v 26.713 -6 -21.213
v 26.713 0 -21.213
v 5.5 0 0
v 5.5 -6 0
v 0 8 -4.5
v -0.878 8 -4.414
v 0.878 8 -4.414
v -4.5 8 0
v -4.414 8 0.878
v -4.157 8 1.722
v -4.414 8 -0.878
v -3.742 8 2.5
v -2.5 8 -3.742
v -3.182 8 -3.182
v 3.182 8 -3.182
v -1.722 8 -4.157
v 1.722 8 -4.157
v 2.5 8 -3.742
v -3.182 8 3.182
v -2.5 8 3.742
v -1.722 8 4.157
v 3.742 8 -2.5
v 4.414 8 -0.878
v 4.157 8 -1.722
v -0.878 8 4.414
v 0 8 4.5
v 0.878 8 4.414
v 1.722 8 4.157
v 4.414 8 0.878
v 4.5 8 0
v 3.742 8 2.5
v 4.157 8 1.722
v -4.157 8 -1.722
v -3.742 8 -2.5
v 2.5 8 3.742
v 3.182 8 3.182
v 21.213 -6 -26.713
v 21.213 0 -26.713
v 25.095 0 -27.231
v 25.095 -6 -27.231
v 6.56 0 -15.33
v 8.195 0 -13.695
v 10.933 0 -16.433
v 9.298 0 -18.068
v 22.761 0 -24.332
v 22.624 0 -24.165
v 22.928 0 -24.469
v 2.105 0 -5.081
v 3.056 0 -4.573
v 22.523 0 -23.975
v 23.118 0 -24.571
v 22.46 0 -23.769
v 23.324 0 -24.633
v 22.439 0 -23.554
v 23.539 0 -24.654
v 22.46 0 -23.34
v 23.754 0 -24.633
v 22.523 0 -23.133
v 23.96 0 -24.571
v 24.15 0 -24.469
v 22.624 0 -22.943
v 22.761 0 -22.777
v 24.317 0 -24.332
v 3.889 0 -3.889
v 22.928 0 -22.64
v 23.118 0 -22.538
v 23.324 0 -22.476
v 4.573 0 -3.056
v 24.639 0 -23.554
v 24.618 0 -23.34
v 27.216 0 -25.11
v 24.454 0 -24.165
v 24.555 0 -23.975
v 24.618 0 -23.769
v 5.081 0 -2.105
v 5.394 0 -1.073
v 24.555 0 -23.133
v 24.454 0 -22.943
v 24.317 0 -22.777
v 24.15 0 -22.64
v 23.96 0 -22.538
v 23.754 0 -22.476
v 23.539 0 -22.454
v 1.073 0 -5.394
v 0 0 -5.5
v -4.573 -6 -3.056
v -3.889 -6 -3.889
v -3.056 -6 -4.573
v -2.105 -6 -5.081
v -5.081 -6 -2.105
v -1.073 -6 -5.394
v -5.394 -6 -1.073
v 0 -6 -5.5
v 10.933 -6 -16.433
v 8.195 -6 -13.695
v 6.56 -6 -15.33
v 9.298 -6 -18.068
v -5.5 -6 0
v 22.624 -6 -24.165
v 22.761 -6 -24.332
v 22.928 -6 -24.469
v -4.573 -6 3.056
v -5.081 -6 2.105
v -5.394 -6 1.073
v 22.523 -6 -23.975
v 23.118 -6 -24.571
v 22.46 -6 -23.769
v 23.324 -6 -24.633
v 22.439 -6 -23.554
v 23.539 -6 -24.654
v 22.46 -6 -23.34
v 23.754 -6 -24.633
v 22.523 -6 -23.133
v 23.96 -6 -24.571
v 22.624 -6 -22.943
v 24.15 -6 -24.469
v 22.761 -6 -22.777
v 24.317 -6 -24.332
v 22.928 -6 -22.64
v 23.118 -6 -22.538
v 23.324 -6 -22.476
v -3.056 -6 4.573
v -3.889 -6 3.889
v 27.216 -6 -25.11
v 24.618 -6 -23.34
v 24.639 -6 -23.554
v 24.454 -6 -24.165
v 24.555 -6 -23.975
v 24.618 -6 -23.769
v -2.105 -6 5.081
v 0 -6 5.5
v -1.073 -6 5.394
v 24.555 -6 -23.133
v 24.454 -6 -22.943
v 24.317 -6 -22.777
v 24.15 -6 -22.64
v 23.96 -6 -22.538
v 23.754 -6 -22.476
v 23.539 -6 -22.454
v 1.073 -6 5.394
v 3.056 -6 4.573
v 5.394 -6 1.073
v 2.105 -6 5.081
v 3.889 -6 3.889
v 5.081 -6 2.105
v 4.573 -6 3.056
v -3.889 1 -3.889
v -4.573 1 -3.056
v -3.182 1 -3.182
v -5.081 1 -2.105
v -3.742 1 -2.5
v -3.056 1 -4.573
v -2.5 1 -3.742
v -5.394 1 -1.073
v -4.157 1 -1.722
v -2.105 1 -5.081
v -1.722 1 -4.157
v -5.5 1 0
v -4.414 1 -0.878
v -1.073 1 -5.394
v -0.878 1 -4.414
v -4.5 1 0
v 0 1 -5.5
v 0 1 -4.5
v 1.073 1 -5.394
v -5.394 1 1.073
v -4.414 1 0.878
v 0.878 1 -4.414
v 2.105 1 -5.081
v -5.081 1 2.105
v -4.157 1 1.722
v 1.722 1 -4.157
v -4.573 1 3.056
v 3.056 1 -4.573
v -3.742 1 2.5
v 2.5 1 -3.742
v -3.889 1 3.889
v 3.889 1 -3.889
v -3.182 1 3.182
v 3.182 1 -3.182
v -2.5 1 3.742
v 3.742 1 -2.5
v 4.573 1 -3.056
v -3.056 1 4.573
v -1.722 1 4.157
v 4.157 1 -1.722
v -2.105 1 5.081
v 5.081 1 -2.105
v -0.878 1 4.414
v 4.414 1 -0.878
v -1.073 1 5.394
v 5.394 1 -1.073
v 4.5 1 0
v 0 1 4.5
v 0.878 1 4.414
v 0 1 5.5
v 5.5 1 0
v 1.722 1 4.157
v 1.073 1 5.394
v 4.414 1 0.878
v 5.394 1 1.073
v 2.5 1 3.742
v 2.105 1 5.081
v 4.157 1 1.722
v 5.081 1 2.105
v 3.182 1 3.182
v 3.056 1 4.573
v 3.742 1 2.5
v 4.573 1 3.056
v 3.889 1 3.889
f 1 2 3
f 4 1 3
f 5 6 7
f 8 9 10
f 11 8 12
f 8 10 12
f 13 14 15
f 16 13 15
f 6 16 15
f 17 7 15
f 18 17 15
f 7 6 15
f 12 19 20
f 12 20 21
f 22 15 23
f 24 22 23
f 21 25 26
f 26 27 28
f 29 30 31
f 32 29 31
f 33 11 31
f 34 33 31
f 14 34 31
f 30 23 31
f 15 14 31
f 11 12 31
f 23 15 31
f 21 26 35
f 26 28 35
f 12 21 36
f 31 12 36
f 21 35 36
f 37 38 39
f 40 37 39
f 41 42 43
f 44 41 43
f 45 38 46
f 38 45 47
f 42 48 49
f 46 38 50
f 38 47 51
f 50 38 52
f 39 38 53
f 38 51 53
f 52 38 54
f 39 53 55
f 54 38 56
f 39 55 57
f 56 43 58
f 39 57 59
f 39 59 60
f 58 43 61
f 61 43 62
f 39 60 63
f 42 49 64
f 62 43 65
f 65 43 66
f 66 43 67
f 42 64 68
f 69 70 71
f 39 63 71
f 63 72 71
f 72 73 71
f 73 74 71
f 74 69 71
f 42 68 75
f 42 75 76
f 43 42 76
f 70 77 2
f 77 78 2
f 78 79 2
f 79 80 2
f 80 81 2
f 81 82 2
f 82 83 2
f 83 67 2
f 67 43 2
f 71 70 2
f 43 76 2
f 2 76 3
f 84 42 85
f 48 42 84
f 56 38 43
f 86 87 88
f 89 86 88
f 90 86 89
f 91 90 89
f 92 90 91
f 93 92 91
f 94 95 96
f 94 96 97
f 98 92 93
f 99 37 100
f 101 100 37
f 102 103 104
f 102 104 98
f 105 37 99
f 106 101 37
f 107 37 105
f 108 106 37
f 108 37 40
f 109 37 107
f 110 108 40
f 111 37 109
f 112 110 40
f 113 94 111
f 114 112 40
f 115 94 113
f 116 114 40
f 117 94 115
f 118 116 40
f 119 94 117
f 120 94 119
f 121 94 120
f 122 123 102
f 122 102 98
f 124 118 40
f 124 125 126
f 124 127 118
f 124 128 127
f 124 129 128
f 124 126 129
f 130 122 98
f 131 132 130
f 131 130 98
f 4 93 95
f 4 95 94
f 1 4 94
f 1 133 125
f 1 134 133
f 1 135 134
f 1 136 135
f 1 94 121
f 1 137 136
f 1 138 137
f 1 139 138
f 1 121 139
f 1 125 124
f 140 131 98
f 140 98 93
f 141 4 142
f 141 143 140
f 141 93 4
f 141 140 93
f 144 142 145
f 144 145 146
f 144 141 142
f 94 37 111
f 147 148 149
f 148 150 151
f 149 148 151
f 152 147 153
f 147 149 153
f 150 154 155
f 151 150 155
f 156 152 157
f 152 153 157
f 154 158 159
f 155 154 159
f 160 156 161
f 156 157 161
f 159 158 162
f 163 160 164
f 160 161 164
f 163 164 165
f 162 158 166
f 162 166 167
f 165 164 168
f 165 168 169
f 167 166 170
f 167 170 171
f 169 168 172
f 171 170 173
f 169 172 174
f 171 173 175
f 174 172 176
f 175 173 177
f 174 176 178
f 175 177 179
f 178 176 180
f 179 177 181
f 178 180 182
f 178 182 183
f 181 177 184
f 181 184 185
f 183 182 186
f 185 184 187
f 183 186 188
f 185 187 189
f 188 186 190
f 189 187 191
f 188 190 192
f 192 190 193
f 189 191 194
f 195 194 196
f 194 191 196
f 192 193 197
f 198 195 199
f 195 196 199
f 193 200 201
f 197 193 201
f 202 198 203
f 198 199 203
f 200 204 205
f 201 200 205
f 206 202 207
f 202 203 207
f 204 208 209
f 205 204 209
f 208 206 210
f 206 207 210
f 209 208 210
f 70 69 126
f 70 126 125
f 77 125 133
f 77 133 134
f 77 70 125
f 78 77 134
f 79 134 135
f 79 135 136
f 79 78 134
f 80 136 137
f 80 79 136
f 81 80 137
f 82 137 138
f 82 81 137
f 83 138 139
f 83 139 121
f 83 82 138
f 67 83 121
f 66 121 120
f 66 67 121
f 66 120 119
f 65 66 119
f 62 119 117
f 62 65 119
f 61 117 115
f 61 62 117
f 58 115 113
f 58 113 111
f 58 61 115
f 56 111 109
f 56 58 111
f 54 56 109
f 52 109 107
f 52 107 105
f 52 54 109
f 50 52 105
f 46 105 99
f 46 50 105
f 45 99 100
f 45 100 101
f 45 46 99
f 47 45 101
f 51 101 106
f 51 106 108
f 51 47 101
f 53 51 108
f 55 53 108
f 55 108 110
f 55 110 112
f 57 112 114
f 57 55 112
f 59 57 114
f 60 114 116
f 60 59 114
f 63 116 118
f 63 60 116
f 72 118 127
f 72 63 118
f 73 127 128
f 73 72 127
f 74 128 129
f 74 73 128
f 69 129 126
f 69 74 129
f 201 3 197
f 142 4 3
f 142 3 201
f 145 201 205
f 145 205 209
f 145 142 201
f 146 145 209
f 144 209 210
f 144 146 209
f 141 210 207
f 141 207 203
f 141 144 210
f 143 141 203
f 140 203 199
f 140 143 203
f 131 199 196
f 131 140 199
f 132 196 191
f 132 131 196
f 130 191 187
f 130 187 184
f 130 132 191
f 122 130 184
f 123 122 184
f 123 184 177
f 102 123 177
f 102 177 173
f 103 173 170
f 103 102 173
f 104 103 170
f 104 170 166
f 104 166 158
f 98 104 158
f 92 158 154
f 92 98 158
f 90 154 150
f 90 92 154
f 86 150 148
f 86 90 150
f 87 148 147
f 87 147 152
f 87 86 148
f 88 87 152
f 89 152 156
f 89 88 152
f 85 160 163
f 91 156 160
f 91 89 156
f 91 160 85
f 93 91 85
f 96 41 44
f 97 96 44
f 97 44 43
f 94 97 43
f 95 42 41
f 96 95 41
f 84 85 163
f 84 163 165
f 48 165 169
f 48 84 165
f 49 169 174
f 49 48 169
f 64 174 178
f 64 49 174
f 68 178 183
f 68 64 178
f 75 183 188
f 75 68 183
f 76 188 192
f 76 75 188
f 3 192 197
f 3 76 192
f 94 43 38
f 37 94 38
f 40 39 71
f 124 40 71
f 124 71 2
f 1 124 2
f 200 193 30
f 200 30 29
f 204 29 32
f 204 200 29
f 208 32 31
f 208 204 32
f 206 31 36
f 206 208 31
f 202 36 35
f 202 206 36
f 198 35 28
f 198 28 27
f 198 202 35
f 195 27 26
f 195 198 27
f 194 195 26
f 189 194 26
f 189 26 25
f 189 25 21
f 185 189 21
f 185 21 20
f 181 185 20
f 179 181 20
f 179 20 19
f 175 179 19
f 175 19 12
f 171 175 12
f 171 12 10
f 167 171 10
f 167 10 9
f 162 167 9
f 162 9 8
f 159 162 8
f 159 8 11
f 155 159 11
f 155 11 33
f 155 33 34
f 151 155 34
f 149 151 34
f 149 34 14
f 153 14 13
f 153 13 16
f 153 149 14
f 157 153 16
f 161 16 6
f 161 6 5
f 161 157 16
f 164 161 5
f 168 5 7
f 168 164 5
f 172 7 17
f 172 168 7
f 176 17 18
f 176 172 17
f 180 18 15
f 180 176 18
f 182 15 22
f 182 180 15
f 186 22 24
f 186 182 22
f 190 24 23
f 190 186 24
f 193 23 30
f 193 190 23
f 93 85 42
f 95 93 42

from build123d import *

# Parameters (mm, degrees)
F0_R     = 1.1
F0_R_2   = 4.5
F1_DEPTH = 6
F2_DEPTH = 1
F3_DEPTH = 8


with BuildPart() as f1:
    # F0 (on Front) → F1 (new body)
    with BuildSketch(Plane.XZ):
        with BuildLine():
            Line((26.7132034356, -21.2132034356), (5.5, 0))
            ThreePointArc((5.5, 0), (3.8890872965, -3.8890872965), (0, -5.5))
            Line((0, -5.5), (8.1949569136, -13.6949569136))
            Line((8.1949569136, -13.6949569136), (10.9329223484, -16.4329223484))
            Line((10.9329223484, -16.4329223484), (21.2132034356, -26.7132034356))
            Line((21.2132034356, -26.7132034356), (25.0945742855, -27.2313275223))
            Line((25.0945742855, -27.2313275223), (27.2158946291, -25.1100071787))
            Line((27.2158946291, -25.1100071787), (26.7132034356, -21.2132034356))
        make_face()
        with Locations((23.5389393669, -23.5543722601)):
            Circle(F0_R, mode=Mode.SUBTRACT)
        with BuildLine():
            ThreePointArc((0, -5.5), (3.8890872965, -3.8890872965), (5.5, 0))
            ThreePointArc((5.5, 0), (-3.8890872965, 3.8890872965), (0, -5.5))
        make_face()
        Circle(F0_R_2, mode=Mode.SUBTRACT)
        Circle(F0_R_2)
        Polygon((10.9329223484, -16.4329223484), (8.1949569136, -13.6949569136), (6.5603537951, -15.3295600321), (9.2983192299, -18.0675254669), align=None)
    extrude(amount=F1_DEPTH)

    # F0 (on Front) → F2 (join)
    with BuildSketch(Plane.XZ):
        with BuildLine():
            ThreePointArc((0, -5.5), (3.8890872965, -3.8890872965), (5.5, 0))
            ThreePointArc((5.5, 0), (-3.8890872965, 3.8890872965), (0, -5.5))
        make_face()
        Circle(F0_R_2, mode=Mode.SUBTRACT)
        Circle(F0_R_2)
    extrude(amount=-F2_DEPTH)

    # F0 (on Front) → F3 (join)
    with BuildSketch(Plane.XZ):
        Circle(F0_R_2)
    extrude(amount=-F3_DEPTH)


solid = f1.part
